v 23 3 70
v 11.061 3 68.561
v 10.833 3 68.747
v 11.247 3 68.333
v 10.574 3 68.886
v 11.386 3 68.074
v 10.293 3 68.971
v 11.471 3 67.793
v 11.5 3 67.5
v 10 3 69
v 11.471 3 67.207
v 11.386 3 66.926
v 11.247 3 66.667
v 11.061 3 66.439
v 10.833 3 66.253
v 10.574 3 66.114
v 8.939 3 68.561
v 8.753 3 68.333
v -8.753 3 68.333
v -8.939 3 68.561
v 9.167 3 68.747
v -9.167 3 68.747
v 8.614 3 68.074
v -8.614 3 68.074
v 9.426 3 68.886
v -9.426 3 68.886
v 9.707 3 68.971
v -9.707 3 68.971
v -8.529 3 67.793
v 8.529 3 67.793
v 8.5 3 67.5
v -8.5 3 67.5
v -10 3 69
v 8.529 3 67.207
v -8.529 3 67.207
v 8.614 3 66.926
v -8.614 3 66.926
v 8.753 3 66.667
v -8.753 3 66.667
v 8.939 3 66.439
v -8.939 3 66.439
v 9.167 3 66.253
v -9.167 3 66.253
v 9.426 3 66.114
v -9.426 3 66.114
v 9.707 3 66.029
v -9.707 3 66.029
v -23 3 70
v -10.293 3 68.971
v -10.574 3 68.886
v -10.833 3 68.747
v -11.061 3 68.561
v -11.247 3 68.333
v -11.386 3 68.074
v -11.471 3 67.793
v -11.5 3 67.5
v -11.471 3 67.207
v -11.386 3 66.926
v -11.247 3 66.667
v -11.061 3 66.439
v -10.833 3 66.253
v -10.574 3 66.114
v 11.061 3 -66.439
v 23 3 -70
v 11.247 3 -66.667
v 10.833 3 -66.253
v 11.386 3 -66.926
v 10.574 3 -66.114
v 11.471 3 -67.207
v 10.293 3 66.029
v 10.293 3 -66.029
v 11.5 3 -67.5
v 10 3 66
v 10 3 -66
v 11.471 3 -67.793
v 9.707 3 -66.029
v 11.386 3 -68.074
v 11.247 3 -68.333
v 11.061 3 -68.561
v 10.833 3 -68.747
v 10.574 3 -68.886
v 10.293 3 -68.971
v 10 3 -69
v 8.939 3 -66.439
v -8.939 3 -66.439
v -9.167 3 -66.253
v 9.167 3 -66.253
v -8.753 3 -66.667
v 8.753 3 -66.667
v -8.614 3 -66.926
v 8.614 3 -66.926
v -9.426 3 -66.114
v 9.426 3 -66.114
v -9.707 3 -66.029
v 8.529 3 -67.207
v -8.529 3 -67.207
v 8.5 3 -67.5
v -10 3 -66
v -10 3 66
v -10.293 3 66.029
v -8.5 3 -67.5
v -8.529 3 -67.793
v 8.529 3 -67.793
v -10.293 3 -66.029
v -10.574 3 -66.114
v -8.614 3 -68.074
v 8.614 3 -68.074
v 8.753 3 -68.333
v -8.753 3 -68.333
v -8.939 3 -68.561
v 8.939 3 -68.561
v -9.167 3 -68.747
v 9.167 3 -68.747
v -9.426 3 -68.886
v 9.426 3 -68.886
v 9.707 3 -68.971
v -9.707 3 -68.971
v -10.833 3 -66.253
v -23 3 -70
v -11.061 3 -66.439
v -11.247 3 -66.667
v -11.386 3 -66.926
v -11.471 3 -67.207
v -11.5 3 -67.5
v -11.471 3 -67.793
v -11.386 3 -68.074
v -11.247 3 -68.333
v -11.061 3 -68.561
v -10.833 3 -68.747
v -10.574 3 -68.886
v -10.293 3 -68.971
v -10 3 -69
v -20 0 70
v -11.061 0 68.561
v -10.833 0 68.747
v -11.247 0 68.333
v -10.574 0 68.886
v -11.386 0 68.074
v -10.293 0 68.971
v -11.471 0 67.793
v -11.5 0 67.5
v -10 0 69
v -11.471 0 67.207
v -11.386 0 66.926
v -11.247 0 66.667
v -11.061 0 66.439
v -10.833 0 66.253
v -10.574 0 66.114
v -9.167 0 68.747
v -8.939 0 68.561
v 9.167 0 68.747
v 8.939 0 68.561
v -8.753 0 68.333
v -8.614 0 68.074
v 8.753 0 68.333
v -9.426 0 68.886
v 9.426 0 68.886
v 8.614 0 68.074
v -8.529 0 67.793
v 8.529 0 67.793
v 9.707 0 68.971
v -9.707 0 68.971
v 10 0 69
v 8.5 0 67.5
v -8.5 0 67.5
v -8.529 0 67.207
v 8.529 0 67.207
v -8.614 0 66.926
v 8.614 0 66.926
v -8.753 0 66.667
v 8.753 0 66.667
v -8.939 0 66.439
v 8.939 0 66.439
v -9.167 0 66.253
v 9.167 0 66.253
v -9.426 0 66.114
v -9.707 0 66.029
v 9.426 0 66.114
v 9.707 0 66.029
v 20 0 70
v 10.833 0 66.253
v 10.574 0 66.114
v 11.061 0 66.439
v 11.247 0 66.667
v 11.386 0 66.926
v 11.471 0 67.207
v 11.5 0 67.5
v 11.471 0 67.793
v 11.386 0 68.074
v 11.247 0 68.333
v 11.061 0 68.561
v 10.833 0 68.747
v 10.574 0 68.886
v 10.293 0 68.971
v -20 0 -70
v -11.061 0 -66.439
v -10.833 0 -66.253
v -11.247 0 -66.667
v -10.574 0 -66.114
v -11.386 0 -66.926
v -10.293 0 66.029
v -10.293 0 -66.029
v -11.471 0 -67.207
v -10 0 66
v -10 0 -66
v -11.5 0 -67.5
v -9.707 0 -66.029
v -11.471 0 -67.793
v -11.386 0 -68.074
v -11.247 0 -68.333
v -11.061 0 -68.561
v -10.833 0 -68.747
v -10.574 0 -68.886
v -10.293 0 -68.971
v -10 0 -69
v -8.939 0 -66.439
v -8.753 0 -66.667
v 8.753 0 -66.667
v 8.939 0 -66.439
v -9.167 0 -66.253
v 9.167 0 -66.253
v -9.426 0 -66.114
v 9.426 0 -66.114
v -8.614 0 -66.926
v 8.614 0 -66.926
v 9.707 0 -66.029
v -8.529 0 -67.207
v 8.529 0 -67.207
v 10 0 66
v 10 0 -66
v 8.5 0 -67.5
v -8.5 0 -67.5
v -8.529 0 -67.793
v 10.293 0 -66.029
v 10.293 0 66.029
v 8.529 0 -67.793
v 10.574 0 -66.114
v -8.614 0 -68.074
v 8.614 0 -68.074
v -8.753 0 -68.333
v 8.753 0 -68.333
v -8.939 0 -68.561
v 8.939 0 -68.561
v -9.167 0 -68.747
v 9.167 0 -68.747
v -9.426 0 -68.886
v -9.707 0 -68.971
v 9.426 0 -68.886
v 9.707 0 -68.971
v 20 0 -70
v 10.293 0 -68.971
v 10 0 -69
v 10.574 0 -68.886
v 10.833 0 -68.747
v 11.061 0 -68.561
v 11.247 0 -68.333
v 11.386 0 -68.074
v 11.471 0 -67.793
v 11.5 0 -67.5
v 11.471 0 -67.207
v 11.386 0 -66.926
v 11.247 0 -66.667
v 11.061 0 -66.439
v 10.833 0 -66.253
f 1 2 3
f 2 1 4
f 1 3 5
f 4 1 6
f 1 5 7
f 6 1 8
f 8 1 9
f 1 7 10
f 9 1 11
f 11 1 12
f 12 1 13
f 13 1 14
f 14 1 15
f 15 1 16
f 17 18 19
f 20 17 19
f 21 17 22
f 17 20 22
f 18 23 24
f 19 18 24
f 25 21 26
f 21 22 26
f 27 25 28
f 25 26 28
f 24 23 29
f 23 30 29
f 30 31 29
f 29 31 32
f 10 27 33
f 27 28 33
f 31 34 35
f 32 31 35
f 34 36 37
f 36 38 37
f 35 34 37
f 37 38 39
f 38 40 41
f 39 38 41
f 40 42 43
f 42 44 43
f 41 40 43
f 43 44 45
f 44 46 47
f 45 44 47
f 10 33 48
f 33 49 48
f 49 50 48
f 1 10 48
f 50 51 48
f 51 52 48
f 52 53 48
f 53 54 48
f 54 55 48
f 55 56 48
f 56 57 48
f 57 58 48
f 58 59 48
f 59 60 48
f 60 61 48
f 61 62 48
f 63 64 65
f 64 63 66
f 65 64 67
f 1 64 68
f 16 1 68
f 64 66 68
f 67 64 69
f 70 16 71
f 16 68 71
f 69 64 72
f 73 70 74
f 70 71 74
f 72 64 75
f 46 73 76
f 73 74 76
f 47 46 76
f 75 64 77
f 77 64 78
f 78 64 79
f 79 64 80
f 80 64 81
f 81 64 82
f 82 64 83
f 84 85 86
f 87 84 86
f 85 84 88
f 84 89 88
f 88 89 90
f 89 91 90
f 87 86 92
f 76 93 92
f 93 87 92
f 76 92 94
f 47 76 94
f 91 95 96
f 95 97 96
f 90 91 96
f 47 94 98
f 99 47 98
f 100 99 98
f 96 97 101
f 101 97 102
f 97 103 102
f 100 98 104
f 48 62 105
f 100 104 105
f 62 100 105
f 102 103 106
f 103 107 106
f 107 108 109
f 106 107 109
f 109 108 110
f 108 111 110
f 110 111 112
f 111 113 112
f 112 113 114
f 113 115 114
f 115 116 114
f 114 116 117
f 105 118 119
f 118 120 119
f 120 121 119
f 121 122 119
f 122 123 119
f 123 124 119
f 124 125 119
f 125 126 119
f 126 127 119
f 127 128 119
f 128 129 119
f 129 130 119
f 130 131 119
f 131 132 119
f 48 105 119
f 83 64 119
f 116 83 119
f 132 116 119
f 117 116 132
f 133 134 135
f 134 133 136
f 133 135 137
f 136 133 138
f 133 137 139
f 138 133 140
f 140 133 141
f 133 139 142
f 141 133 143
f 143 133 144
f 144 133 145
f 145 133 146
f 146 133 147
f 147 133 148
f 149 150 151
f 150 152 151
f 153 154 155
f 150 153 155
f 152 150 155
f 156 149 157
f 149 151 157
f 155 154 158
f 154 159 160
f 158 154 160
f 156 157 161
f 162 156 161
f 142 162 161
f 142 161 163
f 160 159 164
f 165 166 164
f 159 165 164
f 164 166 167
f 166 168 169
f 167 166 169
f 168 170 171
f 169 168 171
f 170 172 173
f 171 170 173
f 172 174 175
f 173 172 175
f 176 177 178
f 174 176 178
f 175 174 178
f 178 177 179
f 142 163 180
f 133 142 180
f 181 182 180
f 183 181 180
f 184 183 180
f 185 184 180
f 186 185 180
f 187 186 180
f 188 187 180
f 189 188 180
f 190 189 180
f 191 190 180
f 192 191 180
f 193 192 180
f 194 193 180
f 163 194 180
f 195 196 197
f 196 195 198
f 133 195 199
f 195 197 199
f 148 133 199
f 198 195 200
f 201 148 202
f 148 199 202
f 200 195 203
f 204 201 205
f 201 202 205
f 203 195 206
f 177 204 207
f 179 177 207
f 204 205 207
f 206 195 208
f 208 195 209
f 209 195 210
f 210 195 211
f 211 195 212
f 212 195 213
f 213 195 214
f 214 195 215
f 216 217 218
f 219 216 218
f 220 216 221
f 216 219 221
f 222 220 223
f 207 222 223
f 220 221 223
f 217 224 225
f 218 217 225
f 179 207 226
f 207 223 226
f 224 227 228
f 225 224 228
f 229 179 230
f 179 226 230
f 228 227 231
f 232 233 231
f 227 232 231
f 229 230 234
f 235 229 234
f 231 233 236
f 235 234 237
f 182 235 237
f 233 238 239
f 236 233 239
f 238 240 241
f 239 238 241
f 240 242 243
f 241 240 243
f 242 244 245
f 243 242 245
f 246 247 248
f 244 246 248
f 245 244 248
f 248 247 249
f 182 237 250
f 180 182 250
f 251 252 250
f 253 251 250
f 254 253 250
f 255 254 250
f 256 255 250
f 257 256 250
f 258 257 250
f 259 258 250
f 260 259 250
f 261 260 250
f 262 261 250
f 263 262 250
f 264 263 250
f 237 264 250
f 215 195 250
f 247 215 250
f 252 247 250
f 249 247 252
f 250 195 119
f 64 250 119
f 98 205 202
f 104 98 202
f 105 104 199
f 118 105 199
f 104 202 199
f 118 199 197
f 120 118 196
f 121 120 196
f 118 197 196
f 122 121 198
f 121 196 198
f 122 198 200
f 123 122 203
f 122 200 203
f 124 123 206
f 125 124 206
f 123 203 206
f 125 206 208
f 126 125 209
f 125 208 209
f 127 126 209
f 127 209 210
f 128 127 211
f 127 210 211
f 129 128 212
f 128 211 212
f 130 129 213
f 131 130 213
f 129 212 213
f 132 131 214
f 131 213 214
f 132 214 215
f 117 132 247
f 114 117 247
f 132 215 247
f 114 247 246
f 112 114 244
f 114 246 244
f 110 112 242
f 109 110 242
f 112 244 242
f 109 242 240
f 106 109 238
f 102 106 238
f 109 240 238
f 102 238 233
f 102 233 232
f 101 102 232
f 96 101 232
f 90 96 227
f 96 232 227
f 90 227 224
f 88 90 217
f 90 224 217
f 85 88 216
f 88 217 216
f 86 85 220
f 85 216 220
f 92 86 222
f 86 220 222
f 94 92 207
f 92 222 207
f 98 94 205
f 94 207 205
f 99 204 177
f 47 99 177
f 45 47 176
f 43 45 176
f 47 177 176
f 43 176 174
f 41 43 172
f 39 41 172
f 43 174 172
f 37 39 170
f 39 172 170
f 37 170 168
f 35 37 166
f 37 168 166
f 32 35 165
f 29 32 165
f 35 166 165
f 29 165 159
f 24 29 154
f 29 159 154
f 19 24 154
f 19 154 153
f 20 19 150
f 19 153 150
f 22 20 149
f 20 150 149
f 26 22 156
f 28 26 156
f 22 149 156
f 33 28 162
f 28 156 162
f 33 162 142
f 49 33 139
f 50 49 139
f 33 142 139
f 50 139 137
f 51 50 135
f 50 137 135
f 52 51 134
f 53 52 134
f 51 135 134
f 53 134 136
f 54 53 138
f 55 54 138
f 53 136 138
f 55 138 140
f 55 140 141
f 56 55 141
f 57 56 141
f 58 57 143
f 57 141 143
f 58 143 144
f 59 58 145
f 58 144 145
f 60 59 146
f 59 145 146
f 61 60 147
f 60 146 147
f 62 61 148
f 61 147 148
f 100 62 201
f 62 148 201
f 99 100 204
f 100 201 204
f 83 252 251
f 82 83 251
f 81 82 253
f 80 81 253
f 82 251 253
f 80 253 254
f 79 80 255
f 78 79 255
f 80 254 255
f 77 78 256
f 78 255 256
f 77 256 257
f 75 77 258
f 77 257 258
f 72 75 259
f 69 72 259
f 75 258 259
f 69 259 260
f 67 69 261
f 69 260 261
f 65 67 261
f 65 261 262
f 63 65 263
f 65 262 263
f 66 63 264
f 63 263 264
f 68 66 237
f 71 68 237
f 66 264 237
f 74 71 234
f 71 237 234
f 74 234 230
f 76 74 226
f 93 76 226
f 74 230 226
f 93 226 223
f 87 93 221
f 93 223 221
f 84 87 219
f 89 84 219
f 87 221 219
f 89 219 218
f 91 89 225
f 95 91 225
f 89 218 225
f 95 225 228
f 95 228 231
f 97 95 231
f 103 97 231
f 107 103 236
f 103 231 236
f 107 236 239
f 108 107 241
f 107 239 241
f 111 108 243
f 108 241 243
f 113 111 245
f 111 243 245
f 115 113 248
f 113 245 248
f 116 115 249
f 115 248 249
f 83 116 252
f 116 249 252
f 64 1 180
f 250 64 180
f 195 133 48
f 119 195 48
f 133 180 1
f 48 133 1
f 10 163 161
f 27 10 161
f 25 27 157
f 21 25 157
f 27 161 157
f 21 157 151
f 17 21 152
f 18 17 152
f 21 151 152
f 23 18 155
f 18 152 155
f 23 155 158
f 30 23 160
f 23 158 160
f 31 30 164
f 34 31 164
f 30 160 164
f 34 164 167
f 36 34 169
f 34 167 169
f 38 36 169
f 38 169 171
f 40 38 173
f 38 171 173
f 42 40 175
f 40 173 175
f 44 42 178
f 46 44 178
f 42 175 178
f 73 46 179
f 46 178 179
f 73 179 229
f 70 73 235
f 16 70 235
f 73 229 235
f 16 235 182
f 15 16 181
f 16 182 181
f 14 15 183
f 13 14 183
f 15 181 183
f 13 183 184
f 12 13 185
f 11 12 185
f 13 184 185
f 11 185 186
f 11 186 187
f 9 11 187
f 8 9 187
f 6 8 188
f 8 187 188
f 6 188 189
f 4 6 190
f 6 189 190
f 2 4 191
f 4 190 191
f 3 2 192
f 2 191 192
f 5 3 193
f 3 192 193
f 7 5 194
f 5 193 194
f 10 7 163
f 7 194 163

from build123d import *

# Parameters (mm, degrees)
SKETCH1_W           = 50
SKETCH1_H           = 140
BOSS_EXTRUDE2_DEPTH = 5
CUT_EXTRUDE1_DEPTH  = 152
SKETCH7_W           = 50
SKETCH7_H           = 2
CUT_EXTRUDE5_DEPTH  = 197
SKETCH8_W           = 30
SKETCH8_H           = 130
CUT_EXTRUDE6_DEPTH  = 197
SKETCH9_W           = 40
SKETCH9_H           = 20
SKETCH9_R           = 1.5
BOSS_EXTRUDE5_DEPTH = 3
SKETCH10_W          = 30
SKETCH10_H          = 10
SKETCH10_R          = 1.5
BOSS_EXTRUDE6_DEPTH = 3
SKETCH11_R          = 1.5
CUT_EXTRUDE7_DEPTH  = 3
SKETCH12_W          = 30.040139405
SKETCH12_H          = 126.520437971
BOSS_EXTRUDE8_DEPTH = 3


with BuildPart() as part:
    # Sketch1 → Boss-Extrude2 (new body)
    with BuildSketch(Plane(origin=(0, 0, 0), x_dir=(1, 0, 0), z_dir=(0, 1, 0))):
        Rectangle(SKETCH1_W, SKETCH1_H)
    extrude(amount=BOSS_EXTRUDE2_DEPTH)

    # Sketch2 → Cut-Extrude1 (cut)
    with BuildSketch(Plane.XY.offset(70)):
        Polygon((-20, 0), (-25, 5), (-25, 0), align=None)
        Polygon((25, 5), (20, 0), (25, 0), align=None)
    extrude(amount=-CUT_EXTRUDE1_DEPTH, mode=Mode.SUBTRACT)

    # Sketch7 → Cut-Extrude5 (cut)
    with BuildSketch(Plane(origin=(0, 0, -70), x_dir=(-1, 0, 0), z_dir=(0, 0, -1))):
        with Locations((0, 4)):
            Rectangle(SKETCH7_W, SKETCH7_H)
    extrude(amount=-CUT_EXTRUDE5_DEPTH, mode=Mode.SUBTRACT)

    # Sketch8 → Cut-Extrude6 (cut)
    with BuildSketch(Plane.XZ):
        Rectangle(SKETCH8_W, SKETCH8_H)
    extrude(amount=-CUT_EXTRUDE6_DEPTH, mode=Mode.SUBTRACT)

    # Sketch9 → Boss-Extrude5 (add)
    with BuildSketch(Plane.XZ):
        with Locations((0, -60)):
            Rectangle(SKETCH9_W, SKETCH9_H)
        with Locations(Location((-13.5, -56.5, 0), (0, 0, 270))):
            Circle(SKETCH9_R, mode=Mode.SUBTRACT)
        with Locations(Location((13.5, -56.5, 0), (0, 0, 90))):
            Circle(SKETCH9_R, mode=Mode.SUBTRACT)
    extrude(amount=-BOSS_EXTRUDE5_DEPTH)

    # Sketch10 → Boss-Extrude6 (add)
    with BuildSketch(Plane.XZ):
        with Locations((0, 50)):
            Rectangle(SKETCH10_W, SKETCH10_H)
        with Locations(Location((-10, 50, 0), (0, 0, 270))):
            Circle(SKETCH10_R, mode=Mode.SUBTRACT)
        with Locations(Location((10, 50, 0), (0, 0, 270))):
            Circle(SKETCH10_R, mode=Mode.SUBTRACT)
    extrude(amount=-BOSS_EXTRUDE6_DEPTH)

    # Sketch11 → Cut-Extrude7 (cut)
    with BuildSketch(Plane.XZ):
        with Locations(Location((-10, 67.5, 0), (0, 0, 270))):
            Circle(SKETCH11_R)
        with Locations(Location((10, 67.5, 0), (0, 0, 90))):
            Circle(SKETCH11_R)
        with Locations(Location((10, -67.5, 0), (0, 0, 270))):
            Circle(SKETCH11_R)
        with Locations(Location((-10, -67.5, 0), (0, 0, 90))):
            Circle(SKETCH11_R)
    extrude(amount=-CUT_EXTRUDE7_DEPTH, mode=Mode.SUBTRACT)

    # Sketch12 → Boss-Extrude8 (add)
    with BuildSketch(Plane(origin=(0, 3, 0), x_dir=(1, 0, 0), z_dir=(0, 1, 0))):
        with Locations((-0.020069702, -1.739781014)):
            Rectangle(SKETCH12_W, SKETCH12_H)
    extrude(amount=-BOSS_EXTRUDE8_DEPTH)


solid = part.part
